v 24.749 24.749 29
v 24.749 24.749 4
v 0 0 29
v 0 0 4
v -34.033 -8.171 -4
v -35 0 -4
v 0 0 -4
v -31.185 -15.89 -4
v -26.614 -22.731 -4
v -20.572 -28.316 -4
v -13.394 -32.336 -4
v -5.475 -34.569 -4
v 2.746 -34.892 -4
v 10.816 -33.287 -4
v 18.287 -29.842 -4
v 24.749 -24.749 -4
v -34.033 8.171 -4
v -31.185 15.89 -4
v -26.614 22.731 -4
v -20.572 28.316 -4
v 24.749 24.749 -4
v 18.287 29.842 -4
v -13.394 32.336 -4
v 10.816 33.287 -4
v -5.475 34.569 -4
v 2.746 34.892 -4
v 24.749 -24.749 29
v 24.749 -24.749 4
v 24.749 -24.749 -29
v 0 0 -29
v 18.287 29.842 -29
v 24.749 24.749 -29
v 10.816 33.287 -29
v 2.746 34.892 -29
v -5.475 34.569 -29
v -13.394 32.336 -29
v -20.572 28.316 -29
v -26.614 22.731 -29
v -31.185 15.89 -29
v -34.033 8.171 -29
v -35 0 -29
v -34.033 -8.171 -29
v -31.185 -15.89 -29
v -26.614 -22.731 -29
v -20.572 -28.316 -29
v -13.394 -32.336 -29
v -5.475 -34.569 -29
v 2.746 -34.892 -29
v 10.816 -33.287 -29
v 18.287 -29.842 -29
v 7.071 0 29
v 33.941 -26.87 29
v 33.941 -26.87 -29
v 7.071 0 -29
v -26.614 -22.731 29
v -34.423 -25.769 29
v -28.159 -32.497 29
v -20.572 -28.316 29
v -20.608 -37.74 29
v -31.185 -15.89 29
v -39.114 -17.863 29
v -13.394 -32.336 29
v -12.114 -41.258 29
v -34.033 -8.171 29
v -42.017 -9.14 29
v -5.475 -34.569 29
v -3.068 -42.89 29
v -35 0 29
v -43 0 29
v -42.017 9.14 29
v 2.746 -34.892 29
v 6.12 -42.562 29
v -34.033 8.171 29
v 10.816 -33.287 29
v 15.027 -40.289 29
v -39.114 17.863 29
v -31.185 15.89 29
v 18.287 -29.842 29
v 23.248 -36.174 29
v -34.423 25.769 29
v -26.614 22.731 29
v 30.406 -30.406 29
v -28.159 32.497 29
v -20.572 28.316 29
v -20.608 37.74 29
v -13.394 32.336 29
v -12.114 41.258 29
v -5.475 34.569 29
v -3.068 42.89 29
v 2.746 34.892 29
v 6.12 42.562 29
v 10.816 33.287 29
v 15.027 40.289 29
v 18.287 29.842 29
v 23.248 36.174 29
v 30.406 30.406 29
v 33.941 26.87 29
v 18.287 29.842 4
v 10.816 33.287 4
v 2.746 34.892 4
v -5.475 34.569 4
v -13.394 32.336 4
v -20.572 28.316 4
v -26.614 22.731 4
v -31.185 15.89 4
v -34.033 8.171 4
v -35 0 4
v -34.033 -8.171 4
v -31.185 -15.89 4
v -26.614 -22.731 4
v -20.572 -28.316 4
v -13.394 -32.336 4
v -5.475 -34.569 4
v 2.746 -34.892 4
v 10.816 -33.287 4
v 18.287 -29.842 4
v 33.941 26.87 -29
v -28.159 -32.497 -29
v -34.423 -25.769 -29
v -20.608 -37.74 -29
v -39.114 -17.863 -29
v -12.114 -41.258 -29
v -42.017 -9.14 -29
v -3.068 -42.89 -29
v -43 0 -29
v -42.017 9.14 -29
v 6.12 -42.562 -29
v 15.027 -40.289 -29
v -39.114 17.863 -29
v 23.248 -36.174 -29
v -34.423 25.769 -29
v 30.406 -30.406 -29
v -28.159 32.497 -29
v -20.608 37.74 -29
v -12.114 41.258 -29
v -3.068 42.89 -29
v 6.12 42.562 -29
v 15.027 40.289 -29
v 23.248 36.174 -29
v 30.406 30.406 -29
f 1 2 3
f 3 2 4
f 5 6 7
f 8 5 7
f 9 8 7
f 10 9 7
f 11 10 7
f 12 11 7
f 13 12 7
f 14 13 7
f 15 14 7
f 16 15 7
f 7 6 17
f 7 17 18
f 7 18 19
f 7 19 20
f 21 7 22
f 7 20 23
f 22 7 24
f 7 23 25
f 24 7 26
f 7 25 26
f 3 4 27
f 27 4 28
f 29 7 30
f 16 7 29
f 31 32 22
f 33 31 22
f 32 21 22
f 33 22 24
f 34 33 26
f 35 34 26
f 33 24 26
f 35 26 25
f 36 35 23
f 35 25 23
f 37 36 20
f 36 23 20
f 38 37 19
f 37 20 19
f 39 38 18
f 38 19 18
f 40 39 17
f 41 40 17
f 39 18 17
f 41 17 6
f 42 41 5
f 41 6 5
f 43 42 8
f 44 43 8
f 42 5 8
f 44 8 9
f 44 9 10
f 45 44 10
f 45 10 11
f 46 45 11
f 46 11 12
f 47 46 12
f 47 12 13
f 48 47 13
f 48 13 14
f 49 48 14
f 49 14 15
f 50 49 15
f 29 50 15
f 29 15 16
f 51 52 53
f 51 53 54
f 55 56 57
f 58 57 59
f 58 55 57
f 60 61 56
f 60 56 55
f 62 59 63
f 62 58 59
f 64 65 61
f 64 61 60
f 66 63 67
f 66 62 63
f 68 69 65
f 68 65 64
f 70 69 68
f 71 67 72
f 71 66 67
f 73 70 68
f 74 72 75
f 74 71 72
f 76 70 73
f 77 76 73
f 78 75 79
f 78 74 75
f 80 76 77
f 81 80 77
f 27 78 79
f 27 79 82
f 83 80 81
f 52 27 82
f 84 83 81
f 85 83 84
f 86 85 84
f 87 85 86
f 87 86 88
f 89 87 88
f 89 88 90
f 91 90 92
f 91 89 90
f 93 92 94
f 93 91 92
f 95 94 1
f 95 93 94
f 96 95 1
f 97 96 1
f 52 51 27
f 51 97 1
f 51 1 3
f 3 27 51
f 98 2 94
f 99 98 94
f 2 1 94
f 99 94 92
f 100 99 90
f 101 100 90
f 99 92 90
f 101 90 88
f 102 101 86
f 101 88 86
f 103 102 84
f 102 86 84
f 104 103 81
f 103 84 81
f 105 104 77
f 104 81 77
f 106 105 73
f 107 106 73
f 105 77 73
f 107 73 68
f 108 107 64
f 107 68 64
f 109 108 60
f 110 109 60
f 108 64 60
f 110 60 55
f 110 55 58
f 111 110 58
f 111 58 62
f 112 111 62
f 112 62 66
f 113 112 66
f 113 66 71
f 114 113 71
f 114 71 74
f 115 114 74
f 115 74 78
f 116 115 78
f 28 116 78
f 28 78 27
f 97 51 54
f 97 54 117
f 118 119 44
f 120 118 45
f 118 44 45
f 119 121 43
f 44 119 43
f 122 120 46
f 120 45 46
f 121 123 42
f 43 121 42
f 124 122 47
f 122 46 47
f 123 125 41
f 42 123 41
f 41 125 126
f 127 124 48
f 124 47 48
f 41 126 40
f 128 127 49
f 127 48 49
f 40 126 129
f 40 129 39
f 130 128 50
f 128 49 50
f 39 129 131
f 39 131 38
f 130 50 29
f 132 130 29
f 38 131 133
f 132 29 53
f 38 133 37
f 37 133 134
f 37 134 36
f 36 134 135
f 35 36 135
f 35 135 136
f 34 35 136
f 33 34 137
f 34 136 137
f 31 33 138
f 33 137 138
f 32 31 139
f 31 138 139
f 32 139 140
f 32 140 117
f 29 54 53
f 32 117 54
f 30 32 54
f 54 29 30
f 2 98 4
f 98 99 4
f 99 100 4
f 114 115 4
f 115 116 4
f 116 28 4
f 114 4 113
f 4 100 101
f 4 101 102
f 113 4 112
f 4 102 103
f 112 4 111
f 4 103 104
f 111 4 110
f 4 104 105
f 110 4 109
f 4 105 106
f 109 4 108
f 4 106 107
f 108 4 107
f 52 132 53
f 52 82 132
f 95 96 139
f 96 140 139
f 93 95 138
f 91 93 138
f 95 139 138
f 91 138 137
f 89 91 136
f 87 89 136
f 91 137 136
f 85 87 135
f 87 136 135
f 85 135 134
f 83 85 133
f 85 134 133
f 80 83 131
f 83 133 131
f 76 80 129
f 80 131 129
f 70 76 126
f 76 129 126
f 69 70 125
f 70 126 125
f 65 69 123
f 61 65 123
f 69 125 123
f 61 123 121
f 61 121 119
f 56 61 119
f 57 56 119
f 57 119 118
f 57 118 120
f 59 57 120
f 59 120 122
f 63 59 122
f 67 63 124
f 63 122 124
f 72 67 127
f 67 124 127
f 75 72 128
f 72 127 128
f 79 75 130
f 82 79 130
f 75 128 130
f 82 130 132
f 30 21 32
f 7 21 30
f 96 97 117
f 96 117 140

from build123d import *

# Parameters (mm, degrees)
F1_ANGLE_BACK = 135
F1_ANGLE      = 270
F3_DEPTH      = 29
F4_DEPTH      = 29


with BuildPart() as f1:
    # F0 (on Front) → F1 (revolve)
    with BuildSketch(Plane.XZ, mode=Mode.PRIVATE) as f1_sk:
        Polygon((0, -4), (0, 4), (-35, 4), (-35, 29), (-43, 29), (-43, -29), (-35, -29), (-35, -4), align=None)
    revolve(f1_sk.sketch.rotate(Axis((0, 0, -1.0322406888), (0, 0, 1)), -F1_ANGLE_BACK), axis=Axis((0, 0, -1.0322406888), (0, 0, 1)), revolution_arc=F1_ANGLE)

    # F2 (on Top) → F3 (join, through all)
    with BuildSketch(Plane.XY):
        Polygon((0, 0), (30.405591591, -30.405591591), (33.941125497, -26.8700576851), (7.0710678119, 0), (33.941125497, 26.8700576851), (30.405591591, 30.405591591), align=None)
    extrude(amount=F3_DEPTH)

    # F4 (add, through all): a face of the model
    f4_faces = [f1.faces().sort_by_distance(p)[0] for p in [
        (15.6952386856, -14.7103529054, 0),
    ]]
    extrude(f4_faces, amount=F4_DEPTH)


solid = f1.part
